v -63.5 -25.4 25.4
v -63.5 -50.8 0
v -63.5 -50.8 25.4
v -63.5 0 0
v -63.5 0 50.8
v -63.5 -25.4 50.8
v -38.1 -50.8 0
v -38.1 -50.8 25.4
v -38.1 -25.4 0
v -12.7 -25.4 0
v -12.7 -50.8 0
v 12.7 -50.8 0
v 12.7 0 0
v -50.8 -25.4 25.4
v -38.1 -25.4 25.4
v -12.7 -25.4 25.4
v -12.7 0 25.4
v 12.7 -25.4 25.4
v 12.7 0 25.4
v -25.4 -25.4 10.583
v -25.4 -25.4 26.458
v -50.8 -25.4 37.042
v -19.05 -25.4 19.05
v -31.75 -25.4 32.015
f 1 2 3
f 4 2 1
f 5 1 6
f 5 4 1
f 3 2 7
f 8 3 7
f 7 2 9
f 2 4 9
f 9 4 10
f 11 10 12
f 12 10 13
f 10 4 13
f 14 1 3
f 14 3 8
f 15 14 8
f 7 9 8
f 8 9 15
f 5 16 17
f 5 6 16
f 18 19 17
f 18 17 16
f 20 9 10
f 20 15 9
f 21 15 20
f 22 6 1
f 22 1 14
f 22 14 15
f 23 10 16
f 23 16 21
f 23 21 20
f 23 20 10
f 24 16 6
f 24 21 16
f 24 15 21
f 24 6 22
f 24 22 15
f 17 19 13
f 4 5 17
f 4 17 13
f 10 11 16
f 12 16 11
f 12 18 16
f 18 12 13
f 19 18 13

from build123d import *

# Parameters (mm, degrees)
F1_DEPTH = 12.7
F4_W     = 25.4
F4_H     = 25.4
F3_W     = 25.4
F3_H     = 50.8
F6_W     = 25.4
F6_H     = 25.4
F7_DEPTH = 25.4


with BuildPart() as f1:
    # F0 (on Right) → F1 (new body, symmetric)
    with BuildSketch(Plane.YZ):
        Polygon((-50.8, 0), (0, 0), (0, 25.4), (-25.4, 25.4), align=None)
    extrude(amount=F1_DEPTH, both=True)

    # F4 (on face) → F5 section 0
    with BuildSketch(Plane(origin=(-12.7, 0, 0), x_dir=(0, -1, 0), z_dir=(-1, 0, 0))):
        with Locations((12.7, 12.7)):
            Rectangle(F4_W, F4_H)
    # F3 (on offset) → F5 section 1
    with BuildSketch(Plane.YZ.offset(-63.5)):
        with Locations((-12.7, 25.4)):
            Rectangle(F3_W, F3_H)
    loft()

    # F6 (on face) → F7 (join)
    with BuildSketch(Plane.XZ.offset(25.4)):
        with Locations((-50.8, 12.7)):
            Rectangle(F6_W, F6_H)
    extrude(amount=F7_DEPTH)


solid = f1.part
